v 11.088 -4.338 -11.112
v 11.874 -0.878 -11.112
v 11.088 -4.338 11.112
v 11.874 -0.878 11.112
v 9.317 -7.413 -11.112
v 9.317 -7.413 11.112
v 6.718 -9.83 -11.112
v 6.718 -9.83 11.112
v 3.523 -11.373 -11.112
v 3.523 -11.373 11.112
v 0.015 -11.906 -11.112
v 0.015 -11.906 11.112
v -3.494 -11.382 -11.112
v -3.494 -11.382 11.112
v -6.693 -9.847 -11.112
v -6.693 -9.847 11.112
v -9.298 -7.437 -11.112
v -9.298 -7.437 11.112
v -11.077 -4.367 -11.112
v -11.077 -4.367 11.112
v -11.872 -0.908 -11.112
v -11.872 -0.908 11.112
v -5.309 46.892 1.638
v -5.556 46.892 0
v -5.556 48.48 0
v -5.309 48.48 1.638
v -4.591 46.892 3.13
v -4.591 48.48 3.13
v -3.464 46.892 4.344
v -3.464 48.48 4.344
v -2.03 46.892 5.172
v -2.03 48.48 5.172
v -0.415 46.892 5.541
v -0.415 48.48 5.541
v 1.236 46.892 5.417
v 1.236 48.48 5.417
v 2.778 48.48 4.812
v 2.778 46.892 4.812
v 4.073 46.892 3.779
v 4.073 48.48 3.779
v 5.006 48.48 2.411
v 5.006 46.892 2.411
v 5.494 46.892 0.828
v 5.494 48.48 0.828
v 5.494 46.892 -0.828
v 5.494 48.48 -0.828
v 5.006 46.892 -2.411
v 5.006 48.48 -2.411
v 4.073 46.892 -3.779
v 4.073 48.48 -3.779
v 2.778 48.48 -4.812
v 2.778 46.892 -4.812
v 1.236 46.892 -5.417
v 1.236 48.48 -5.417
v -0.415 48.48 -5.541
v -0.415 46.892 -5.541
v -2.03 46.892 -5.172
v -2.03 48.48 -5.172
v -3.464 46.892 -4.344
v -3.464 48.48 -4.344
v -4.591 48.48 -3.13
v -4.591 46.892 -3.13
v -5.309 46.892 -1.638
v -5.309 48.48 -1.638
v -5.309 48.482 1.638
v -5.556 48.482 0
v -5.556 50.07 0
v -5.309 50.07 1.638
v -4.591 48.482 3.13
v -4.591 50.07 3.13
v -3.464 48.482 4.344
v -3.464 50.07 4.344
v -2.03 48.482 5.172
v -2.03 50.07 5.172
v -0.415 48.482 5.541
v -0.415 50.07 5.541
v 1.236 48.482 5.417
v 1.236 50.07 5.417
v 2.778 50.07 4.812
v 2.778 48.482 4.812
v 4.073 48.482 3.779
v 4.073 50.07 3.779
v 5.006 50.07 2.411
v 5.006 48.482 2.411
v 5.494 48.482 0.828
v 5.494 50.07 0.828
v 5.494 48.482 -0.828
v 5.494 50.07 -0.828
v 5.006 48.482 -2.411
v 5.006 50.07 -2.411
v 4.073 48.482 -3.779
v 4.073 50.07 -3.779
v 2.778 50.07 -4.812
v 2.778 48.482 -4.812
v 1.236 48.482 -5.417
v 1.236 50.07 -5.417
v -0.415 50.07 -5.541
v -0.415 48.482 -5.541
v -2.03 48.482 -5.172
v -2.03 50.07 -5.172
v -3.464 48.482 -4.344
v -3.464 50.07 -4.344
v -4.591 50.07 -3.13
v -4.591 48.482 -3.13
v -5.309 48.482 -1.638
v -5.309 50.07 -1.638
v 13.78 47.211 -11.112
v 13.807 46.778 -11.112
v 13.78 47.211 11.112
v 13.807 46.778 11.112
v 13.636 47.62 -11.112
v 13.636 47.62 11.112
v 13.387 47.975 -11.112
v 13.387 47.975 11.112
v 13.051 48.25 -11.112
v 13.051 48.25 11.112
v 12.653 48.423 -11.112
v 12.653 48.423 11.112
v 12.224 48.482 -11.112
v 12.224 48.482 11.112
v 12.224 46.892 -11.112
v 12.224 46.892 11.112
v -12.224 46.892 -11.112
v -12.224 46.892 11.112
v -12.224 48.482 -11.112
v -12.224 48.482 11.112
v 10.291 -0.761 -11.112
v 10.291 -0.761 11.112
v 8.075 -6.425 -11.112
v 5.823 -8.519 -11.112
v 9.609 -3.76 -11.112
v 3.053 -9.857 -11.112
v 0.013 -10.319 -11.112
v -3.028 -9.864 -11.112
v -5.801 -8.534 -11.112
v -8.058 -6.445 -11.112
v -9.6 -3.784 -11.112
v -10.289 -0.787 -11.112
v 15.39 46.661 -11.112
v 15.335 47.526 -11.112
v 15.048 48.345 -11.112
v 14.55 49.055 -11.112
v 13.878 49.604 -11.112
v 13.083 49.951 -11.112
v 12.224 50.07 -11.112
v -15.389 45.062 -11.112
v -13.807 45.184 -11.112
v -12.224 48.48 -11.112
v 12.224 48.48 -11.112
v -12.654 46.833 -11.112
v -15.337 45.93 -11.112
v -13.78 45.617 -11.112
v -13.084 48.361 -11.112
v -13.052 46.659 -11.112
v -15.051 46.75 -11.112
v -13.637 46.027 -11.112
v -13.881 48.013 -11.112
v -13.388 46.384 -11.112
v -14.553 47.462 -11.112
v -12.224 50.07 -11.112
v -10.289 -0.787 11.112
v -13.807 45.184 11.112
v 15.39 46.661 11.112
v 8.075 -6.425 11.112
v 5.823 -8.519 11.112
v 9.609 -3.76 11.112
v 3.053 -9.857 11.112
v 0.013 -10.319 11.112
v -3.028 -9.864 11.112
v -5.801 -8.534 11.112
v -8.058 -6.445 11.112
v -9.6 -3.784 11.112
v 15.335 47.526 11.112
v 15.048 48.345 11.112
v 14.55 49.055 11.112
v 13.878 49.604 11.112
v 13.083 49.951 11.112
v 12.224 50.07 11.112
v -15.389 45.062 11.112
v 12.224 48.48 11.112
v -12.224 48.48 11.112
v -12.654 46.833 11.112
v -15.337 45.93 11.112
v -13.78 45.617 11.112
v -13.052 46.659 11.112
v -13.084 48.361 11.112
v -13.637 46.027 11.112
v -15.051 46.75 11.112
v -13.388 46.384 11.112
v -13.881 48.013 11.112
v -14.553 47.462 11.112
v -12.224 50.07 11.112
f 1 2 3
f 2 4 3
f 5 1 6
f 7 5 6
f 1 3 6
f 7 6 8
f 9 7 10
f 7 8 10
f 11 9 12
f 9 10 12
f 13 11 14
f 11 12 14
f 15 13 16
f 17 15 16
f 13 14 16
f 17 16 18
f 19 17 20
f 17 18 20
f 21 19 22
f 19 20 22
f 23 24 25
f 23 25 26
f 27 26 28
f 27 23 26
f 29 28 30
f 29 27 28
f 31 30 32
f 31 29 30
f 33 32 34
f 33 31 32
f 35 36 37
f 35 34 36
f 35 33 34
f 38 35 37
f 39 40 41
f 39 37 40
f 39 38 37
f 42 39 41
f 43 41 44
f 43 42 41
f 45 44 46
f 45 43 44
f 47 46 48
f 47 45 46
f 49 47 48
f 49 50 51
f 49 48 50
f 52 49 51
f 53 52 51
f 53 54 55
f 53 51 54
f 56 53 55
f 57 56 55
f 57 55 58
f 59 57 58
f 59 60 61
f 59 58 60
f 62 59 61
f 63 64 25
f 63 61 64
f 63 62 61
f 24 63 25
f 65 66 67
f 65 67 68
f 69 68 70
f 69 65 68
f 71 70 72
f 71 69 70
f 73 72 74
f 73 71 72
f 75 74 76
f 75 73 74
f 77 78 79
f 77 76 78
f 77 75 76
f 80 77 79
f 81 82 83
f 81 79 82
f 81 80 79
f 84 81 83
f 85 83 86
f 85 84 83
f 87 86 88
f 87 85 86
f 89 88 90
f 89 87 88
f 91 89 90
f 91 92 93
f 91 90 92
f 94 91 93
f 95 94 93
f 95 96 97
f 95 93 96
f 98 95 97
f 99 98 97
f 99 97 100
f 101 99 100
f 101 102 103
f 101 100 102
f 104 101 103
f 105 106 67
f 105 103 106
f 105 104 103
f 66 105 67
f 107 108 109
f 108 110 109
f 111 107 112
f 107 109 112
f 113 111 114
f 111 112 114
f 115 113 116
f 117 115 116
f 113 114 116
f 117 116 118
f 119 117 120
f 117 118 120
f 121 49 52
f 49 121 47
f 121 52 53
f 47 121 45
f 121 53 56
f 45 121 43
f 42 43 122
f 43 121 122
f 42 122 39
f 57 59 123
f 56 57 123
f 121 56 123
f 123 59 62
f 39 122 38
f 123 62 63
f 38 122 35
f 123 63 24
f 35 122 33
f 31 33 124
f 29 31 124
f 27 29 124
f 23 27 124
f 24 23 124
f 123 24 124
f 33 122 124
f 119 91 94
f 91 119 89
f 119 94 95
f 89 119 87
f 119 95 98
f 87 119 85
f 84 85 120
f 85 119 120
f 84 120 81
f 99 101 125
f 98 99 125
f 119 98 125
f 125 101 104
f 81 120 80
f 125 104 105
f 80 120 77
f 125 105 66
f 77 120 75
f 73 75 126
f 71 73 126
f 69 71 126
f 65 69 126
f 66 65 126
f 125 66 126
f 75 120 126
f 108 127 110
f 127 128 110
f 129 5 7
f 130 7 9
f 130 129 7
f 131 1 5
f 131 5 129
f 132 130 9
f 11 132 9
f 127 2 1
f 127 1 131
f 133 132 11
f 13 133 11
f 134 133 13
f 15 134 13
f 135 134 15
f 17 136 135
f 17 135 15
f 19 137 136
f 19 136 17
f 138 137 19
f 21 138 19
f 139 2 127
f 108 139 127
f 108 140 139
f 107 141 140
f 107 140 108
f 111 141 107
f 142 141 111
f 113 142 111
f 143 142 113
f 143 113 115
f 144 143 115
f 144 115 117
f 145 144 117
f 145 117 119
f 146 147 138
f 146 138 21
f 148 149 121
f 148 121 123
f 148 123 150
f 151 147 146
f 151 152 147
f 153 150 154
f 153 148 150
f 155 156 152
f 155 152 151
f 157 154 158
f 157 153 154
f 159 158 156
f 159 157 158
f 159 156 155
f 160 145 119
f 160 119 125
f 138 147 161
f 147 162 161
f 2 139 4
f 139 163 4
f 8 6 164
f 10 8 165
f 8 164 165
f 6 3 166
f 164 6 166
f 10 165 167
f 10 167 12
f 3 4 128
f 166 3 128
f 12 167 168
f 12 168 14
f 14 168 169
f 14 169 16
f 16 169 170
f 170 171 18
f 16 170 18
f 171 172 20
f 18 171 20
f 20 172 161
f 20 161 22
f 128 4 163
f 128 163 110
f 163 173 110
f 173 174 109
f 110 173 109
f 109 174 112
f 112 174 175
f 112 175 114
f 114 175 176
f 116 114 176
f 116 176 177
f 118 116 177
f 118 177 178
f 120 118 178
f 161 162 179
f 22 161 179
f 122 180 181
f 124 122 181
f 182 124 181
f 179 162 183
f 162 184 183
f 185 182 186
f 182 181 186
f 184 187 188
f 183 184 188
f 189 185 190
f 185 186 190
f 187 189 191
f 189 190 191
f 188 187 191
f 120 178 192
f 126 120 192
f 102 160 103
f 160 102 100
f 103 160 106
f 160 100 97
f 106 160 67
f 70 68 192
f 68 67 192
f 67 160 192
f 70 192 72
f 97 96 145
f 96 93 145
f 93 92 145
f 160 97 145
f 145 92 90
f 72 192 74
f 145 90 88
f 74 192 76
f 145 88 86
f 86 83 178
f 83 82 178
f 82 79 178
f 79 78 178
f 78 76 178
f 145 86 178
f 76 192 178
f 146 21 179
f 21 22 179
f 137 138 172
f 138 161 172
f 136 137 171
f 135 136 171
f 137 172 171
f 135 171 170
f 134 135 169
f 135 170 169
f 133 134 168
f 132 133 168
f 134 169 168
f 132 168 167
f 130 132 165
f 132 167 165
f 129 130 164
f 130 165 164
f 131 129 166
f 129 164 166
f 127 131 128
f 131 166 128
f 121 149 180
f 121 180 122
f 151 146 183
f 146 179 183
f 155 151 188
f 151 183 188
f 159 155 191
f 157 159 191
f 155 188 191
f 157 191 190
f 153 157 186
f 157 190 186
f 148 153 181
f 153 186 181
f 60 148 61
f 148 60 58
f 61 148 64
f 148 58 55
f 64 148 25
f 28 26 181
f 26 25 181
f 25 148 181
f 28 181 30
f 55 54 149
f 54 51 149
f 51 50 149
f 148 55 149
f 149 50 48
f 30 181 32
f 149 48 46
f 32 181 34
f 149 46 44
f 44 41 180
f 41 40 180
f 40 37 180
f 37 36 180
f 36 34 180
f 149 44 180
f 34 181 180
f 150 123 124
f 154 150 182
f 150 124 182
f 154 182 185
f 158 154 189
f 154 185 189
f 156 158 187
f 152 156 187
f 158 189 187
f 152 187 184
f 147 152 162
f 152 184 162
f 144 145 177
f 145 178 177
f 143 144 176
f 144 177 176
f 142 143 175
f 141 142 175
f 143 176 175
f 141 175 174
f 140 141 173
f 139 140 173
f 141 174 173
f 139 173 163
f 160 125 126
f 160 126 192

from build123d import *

# Parameters (mm, degrees)
BOSS_EXTRUDE1_DEPTH = 11.1125
SKETCH2_R           = 5.55625
CUT_EXTRUDE1_DEPTH  = 54.549874163


with BuildPart() as part:
    # Sketch1 → Boss-Extrude1 (new, symmetric)
    with BuildSketch(Plane.XY):
        with BuildLine():
            Line((-12.22375, 50.06975), (12.22375, 50.06975))
            ThreePointArc((12.22375, 50.06975), (14.550144612, 49.055424226), (15.390100159, 46.660545659))
            Line((15.390100159, 46.660545659), (11.873813095, -0.878266277))
            ThreePointArc((11.873813095, -0.878266277), (0.015148097, -11.906240364), (-11.871539853, -0.908477065))
            Line((-11.871539853, -0.908477065), (-15.389493961, 45.062449449))
            ThreePointArc((-15.389493961, 45.062449449), (-14.552891714, 47.462422649), (-12.22375, 48.47971))
            Line((-12.22375, 48.47971), (12.22375, 48.47971))
            Line((12.22375, 48.47971), (12.22375, 46.89221))
            Line((12.22375, 46.89221), (-12.22375, 46.89221))
            ThreePointArc((-12.22375, 46.89221), (-13.388320857, 46.383566325), (-13.80662198, 45.183579725))
            Line((-13.80662198, 45.183579725), (-10.288667873, -0.78734679))
            ThreePointArc((-10.288667873, -0.78734679), (0.01312835, -10.318741649), (10.290638015, -0.761164107))
            Line((10.290638015, -0.761164107), (13.806925079, 46.77764783))
            ThreePointArc((13.806925079, 46.77764783), (13.386947306, 47.975087113), (12.22375, 48.48225))
            Line((12.22375, 48.48225), (-12.22375, 48.48225))
            Line((-12.22375, 48.48225), (-12.22375, 50.06975))
        make_face()
    extrude(amount=BOSS_EXTRUDE1_DEPTH, both=True)

    # Sketch2 → Cut-Extrude1 (cut, through all)
    with BuildSketch(Plane(origin=(0, 0, 0), x_dir=(1, 0, 0), z_dir=(0, 1, 0))):
        with Locations(Location((0, 0, 0), (0, 0, 180))):
            Circle(SKETCH2_R)
    extrude(amount=CUT_EXTRUDE1_DEPTH, mode=Mode.SUBTRACT)


solid = part.part
